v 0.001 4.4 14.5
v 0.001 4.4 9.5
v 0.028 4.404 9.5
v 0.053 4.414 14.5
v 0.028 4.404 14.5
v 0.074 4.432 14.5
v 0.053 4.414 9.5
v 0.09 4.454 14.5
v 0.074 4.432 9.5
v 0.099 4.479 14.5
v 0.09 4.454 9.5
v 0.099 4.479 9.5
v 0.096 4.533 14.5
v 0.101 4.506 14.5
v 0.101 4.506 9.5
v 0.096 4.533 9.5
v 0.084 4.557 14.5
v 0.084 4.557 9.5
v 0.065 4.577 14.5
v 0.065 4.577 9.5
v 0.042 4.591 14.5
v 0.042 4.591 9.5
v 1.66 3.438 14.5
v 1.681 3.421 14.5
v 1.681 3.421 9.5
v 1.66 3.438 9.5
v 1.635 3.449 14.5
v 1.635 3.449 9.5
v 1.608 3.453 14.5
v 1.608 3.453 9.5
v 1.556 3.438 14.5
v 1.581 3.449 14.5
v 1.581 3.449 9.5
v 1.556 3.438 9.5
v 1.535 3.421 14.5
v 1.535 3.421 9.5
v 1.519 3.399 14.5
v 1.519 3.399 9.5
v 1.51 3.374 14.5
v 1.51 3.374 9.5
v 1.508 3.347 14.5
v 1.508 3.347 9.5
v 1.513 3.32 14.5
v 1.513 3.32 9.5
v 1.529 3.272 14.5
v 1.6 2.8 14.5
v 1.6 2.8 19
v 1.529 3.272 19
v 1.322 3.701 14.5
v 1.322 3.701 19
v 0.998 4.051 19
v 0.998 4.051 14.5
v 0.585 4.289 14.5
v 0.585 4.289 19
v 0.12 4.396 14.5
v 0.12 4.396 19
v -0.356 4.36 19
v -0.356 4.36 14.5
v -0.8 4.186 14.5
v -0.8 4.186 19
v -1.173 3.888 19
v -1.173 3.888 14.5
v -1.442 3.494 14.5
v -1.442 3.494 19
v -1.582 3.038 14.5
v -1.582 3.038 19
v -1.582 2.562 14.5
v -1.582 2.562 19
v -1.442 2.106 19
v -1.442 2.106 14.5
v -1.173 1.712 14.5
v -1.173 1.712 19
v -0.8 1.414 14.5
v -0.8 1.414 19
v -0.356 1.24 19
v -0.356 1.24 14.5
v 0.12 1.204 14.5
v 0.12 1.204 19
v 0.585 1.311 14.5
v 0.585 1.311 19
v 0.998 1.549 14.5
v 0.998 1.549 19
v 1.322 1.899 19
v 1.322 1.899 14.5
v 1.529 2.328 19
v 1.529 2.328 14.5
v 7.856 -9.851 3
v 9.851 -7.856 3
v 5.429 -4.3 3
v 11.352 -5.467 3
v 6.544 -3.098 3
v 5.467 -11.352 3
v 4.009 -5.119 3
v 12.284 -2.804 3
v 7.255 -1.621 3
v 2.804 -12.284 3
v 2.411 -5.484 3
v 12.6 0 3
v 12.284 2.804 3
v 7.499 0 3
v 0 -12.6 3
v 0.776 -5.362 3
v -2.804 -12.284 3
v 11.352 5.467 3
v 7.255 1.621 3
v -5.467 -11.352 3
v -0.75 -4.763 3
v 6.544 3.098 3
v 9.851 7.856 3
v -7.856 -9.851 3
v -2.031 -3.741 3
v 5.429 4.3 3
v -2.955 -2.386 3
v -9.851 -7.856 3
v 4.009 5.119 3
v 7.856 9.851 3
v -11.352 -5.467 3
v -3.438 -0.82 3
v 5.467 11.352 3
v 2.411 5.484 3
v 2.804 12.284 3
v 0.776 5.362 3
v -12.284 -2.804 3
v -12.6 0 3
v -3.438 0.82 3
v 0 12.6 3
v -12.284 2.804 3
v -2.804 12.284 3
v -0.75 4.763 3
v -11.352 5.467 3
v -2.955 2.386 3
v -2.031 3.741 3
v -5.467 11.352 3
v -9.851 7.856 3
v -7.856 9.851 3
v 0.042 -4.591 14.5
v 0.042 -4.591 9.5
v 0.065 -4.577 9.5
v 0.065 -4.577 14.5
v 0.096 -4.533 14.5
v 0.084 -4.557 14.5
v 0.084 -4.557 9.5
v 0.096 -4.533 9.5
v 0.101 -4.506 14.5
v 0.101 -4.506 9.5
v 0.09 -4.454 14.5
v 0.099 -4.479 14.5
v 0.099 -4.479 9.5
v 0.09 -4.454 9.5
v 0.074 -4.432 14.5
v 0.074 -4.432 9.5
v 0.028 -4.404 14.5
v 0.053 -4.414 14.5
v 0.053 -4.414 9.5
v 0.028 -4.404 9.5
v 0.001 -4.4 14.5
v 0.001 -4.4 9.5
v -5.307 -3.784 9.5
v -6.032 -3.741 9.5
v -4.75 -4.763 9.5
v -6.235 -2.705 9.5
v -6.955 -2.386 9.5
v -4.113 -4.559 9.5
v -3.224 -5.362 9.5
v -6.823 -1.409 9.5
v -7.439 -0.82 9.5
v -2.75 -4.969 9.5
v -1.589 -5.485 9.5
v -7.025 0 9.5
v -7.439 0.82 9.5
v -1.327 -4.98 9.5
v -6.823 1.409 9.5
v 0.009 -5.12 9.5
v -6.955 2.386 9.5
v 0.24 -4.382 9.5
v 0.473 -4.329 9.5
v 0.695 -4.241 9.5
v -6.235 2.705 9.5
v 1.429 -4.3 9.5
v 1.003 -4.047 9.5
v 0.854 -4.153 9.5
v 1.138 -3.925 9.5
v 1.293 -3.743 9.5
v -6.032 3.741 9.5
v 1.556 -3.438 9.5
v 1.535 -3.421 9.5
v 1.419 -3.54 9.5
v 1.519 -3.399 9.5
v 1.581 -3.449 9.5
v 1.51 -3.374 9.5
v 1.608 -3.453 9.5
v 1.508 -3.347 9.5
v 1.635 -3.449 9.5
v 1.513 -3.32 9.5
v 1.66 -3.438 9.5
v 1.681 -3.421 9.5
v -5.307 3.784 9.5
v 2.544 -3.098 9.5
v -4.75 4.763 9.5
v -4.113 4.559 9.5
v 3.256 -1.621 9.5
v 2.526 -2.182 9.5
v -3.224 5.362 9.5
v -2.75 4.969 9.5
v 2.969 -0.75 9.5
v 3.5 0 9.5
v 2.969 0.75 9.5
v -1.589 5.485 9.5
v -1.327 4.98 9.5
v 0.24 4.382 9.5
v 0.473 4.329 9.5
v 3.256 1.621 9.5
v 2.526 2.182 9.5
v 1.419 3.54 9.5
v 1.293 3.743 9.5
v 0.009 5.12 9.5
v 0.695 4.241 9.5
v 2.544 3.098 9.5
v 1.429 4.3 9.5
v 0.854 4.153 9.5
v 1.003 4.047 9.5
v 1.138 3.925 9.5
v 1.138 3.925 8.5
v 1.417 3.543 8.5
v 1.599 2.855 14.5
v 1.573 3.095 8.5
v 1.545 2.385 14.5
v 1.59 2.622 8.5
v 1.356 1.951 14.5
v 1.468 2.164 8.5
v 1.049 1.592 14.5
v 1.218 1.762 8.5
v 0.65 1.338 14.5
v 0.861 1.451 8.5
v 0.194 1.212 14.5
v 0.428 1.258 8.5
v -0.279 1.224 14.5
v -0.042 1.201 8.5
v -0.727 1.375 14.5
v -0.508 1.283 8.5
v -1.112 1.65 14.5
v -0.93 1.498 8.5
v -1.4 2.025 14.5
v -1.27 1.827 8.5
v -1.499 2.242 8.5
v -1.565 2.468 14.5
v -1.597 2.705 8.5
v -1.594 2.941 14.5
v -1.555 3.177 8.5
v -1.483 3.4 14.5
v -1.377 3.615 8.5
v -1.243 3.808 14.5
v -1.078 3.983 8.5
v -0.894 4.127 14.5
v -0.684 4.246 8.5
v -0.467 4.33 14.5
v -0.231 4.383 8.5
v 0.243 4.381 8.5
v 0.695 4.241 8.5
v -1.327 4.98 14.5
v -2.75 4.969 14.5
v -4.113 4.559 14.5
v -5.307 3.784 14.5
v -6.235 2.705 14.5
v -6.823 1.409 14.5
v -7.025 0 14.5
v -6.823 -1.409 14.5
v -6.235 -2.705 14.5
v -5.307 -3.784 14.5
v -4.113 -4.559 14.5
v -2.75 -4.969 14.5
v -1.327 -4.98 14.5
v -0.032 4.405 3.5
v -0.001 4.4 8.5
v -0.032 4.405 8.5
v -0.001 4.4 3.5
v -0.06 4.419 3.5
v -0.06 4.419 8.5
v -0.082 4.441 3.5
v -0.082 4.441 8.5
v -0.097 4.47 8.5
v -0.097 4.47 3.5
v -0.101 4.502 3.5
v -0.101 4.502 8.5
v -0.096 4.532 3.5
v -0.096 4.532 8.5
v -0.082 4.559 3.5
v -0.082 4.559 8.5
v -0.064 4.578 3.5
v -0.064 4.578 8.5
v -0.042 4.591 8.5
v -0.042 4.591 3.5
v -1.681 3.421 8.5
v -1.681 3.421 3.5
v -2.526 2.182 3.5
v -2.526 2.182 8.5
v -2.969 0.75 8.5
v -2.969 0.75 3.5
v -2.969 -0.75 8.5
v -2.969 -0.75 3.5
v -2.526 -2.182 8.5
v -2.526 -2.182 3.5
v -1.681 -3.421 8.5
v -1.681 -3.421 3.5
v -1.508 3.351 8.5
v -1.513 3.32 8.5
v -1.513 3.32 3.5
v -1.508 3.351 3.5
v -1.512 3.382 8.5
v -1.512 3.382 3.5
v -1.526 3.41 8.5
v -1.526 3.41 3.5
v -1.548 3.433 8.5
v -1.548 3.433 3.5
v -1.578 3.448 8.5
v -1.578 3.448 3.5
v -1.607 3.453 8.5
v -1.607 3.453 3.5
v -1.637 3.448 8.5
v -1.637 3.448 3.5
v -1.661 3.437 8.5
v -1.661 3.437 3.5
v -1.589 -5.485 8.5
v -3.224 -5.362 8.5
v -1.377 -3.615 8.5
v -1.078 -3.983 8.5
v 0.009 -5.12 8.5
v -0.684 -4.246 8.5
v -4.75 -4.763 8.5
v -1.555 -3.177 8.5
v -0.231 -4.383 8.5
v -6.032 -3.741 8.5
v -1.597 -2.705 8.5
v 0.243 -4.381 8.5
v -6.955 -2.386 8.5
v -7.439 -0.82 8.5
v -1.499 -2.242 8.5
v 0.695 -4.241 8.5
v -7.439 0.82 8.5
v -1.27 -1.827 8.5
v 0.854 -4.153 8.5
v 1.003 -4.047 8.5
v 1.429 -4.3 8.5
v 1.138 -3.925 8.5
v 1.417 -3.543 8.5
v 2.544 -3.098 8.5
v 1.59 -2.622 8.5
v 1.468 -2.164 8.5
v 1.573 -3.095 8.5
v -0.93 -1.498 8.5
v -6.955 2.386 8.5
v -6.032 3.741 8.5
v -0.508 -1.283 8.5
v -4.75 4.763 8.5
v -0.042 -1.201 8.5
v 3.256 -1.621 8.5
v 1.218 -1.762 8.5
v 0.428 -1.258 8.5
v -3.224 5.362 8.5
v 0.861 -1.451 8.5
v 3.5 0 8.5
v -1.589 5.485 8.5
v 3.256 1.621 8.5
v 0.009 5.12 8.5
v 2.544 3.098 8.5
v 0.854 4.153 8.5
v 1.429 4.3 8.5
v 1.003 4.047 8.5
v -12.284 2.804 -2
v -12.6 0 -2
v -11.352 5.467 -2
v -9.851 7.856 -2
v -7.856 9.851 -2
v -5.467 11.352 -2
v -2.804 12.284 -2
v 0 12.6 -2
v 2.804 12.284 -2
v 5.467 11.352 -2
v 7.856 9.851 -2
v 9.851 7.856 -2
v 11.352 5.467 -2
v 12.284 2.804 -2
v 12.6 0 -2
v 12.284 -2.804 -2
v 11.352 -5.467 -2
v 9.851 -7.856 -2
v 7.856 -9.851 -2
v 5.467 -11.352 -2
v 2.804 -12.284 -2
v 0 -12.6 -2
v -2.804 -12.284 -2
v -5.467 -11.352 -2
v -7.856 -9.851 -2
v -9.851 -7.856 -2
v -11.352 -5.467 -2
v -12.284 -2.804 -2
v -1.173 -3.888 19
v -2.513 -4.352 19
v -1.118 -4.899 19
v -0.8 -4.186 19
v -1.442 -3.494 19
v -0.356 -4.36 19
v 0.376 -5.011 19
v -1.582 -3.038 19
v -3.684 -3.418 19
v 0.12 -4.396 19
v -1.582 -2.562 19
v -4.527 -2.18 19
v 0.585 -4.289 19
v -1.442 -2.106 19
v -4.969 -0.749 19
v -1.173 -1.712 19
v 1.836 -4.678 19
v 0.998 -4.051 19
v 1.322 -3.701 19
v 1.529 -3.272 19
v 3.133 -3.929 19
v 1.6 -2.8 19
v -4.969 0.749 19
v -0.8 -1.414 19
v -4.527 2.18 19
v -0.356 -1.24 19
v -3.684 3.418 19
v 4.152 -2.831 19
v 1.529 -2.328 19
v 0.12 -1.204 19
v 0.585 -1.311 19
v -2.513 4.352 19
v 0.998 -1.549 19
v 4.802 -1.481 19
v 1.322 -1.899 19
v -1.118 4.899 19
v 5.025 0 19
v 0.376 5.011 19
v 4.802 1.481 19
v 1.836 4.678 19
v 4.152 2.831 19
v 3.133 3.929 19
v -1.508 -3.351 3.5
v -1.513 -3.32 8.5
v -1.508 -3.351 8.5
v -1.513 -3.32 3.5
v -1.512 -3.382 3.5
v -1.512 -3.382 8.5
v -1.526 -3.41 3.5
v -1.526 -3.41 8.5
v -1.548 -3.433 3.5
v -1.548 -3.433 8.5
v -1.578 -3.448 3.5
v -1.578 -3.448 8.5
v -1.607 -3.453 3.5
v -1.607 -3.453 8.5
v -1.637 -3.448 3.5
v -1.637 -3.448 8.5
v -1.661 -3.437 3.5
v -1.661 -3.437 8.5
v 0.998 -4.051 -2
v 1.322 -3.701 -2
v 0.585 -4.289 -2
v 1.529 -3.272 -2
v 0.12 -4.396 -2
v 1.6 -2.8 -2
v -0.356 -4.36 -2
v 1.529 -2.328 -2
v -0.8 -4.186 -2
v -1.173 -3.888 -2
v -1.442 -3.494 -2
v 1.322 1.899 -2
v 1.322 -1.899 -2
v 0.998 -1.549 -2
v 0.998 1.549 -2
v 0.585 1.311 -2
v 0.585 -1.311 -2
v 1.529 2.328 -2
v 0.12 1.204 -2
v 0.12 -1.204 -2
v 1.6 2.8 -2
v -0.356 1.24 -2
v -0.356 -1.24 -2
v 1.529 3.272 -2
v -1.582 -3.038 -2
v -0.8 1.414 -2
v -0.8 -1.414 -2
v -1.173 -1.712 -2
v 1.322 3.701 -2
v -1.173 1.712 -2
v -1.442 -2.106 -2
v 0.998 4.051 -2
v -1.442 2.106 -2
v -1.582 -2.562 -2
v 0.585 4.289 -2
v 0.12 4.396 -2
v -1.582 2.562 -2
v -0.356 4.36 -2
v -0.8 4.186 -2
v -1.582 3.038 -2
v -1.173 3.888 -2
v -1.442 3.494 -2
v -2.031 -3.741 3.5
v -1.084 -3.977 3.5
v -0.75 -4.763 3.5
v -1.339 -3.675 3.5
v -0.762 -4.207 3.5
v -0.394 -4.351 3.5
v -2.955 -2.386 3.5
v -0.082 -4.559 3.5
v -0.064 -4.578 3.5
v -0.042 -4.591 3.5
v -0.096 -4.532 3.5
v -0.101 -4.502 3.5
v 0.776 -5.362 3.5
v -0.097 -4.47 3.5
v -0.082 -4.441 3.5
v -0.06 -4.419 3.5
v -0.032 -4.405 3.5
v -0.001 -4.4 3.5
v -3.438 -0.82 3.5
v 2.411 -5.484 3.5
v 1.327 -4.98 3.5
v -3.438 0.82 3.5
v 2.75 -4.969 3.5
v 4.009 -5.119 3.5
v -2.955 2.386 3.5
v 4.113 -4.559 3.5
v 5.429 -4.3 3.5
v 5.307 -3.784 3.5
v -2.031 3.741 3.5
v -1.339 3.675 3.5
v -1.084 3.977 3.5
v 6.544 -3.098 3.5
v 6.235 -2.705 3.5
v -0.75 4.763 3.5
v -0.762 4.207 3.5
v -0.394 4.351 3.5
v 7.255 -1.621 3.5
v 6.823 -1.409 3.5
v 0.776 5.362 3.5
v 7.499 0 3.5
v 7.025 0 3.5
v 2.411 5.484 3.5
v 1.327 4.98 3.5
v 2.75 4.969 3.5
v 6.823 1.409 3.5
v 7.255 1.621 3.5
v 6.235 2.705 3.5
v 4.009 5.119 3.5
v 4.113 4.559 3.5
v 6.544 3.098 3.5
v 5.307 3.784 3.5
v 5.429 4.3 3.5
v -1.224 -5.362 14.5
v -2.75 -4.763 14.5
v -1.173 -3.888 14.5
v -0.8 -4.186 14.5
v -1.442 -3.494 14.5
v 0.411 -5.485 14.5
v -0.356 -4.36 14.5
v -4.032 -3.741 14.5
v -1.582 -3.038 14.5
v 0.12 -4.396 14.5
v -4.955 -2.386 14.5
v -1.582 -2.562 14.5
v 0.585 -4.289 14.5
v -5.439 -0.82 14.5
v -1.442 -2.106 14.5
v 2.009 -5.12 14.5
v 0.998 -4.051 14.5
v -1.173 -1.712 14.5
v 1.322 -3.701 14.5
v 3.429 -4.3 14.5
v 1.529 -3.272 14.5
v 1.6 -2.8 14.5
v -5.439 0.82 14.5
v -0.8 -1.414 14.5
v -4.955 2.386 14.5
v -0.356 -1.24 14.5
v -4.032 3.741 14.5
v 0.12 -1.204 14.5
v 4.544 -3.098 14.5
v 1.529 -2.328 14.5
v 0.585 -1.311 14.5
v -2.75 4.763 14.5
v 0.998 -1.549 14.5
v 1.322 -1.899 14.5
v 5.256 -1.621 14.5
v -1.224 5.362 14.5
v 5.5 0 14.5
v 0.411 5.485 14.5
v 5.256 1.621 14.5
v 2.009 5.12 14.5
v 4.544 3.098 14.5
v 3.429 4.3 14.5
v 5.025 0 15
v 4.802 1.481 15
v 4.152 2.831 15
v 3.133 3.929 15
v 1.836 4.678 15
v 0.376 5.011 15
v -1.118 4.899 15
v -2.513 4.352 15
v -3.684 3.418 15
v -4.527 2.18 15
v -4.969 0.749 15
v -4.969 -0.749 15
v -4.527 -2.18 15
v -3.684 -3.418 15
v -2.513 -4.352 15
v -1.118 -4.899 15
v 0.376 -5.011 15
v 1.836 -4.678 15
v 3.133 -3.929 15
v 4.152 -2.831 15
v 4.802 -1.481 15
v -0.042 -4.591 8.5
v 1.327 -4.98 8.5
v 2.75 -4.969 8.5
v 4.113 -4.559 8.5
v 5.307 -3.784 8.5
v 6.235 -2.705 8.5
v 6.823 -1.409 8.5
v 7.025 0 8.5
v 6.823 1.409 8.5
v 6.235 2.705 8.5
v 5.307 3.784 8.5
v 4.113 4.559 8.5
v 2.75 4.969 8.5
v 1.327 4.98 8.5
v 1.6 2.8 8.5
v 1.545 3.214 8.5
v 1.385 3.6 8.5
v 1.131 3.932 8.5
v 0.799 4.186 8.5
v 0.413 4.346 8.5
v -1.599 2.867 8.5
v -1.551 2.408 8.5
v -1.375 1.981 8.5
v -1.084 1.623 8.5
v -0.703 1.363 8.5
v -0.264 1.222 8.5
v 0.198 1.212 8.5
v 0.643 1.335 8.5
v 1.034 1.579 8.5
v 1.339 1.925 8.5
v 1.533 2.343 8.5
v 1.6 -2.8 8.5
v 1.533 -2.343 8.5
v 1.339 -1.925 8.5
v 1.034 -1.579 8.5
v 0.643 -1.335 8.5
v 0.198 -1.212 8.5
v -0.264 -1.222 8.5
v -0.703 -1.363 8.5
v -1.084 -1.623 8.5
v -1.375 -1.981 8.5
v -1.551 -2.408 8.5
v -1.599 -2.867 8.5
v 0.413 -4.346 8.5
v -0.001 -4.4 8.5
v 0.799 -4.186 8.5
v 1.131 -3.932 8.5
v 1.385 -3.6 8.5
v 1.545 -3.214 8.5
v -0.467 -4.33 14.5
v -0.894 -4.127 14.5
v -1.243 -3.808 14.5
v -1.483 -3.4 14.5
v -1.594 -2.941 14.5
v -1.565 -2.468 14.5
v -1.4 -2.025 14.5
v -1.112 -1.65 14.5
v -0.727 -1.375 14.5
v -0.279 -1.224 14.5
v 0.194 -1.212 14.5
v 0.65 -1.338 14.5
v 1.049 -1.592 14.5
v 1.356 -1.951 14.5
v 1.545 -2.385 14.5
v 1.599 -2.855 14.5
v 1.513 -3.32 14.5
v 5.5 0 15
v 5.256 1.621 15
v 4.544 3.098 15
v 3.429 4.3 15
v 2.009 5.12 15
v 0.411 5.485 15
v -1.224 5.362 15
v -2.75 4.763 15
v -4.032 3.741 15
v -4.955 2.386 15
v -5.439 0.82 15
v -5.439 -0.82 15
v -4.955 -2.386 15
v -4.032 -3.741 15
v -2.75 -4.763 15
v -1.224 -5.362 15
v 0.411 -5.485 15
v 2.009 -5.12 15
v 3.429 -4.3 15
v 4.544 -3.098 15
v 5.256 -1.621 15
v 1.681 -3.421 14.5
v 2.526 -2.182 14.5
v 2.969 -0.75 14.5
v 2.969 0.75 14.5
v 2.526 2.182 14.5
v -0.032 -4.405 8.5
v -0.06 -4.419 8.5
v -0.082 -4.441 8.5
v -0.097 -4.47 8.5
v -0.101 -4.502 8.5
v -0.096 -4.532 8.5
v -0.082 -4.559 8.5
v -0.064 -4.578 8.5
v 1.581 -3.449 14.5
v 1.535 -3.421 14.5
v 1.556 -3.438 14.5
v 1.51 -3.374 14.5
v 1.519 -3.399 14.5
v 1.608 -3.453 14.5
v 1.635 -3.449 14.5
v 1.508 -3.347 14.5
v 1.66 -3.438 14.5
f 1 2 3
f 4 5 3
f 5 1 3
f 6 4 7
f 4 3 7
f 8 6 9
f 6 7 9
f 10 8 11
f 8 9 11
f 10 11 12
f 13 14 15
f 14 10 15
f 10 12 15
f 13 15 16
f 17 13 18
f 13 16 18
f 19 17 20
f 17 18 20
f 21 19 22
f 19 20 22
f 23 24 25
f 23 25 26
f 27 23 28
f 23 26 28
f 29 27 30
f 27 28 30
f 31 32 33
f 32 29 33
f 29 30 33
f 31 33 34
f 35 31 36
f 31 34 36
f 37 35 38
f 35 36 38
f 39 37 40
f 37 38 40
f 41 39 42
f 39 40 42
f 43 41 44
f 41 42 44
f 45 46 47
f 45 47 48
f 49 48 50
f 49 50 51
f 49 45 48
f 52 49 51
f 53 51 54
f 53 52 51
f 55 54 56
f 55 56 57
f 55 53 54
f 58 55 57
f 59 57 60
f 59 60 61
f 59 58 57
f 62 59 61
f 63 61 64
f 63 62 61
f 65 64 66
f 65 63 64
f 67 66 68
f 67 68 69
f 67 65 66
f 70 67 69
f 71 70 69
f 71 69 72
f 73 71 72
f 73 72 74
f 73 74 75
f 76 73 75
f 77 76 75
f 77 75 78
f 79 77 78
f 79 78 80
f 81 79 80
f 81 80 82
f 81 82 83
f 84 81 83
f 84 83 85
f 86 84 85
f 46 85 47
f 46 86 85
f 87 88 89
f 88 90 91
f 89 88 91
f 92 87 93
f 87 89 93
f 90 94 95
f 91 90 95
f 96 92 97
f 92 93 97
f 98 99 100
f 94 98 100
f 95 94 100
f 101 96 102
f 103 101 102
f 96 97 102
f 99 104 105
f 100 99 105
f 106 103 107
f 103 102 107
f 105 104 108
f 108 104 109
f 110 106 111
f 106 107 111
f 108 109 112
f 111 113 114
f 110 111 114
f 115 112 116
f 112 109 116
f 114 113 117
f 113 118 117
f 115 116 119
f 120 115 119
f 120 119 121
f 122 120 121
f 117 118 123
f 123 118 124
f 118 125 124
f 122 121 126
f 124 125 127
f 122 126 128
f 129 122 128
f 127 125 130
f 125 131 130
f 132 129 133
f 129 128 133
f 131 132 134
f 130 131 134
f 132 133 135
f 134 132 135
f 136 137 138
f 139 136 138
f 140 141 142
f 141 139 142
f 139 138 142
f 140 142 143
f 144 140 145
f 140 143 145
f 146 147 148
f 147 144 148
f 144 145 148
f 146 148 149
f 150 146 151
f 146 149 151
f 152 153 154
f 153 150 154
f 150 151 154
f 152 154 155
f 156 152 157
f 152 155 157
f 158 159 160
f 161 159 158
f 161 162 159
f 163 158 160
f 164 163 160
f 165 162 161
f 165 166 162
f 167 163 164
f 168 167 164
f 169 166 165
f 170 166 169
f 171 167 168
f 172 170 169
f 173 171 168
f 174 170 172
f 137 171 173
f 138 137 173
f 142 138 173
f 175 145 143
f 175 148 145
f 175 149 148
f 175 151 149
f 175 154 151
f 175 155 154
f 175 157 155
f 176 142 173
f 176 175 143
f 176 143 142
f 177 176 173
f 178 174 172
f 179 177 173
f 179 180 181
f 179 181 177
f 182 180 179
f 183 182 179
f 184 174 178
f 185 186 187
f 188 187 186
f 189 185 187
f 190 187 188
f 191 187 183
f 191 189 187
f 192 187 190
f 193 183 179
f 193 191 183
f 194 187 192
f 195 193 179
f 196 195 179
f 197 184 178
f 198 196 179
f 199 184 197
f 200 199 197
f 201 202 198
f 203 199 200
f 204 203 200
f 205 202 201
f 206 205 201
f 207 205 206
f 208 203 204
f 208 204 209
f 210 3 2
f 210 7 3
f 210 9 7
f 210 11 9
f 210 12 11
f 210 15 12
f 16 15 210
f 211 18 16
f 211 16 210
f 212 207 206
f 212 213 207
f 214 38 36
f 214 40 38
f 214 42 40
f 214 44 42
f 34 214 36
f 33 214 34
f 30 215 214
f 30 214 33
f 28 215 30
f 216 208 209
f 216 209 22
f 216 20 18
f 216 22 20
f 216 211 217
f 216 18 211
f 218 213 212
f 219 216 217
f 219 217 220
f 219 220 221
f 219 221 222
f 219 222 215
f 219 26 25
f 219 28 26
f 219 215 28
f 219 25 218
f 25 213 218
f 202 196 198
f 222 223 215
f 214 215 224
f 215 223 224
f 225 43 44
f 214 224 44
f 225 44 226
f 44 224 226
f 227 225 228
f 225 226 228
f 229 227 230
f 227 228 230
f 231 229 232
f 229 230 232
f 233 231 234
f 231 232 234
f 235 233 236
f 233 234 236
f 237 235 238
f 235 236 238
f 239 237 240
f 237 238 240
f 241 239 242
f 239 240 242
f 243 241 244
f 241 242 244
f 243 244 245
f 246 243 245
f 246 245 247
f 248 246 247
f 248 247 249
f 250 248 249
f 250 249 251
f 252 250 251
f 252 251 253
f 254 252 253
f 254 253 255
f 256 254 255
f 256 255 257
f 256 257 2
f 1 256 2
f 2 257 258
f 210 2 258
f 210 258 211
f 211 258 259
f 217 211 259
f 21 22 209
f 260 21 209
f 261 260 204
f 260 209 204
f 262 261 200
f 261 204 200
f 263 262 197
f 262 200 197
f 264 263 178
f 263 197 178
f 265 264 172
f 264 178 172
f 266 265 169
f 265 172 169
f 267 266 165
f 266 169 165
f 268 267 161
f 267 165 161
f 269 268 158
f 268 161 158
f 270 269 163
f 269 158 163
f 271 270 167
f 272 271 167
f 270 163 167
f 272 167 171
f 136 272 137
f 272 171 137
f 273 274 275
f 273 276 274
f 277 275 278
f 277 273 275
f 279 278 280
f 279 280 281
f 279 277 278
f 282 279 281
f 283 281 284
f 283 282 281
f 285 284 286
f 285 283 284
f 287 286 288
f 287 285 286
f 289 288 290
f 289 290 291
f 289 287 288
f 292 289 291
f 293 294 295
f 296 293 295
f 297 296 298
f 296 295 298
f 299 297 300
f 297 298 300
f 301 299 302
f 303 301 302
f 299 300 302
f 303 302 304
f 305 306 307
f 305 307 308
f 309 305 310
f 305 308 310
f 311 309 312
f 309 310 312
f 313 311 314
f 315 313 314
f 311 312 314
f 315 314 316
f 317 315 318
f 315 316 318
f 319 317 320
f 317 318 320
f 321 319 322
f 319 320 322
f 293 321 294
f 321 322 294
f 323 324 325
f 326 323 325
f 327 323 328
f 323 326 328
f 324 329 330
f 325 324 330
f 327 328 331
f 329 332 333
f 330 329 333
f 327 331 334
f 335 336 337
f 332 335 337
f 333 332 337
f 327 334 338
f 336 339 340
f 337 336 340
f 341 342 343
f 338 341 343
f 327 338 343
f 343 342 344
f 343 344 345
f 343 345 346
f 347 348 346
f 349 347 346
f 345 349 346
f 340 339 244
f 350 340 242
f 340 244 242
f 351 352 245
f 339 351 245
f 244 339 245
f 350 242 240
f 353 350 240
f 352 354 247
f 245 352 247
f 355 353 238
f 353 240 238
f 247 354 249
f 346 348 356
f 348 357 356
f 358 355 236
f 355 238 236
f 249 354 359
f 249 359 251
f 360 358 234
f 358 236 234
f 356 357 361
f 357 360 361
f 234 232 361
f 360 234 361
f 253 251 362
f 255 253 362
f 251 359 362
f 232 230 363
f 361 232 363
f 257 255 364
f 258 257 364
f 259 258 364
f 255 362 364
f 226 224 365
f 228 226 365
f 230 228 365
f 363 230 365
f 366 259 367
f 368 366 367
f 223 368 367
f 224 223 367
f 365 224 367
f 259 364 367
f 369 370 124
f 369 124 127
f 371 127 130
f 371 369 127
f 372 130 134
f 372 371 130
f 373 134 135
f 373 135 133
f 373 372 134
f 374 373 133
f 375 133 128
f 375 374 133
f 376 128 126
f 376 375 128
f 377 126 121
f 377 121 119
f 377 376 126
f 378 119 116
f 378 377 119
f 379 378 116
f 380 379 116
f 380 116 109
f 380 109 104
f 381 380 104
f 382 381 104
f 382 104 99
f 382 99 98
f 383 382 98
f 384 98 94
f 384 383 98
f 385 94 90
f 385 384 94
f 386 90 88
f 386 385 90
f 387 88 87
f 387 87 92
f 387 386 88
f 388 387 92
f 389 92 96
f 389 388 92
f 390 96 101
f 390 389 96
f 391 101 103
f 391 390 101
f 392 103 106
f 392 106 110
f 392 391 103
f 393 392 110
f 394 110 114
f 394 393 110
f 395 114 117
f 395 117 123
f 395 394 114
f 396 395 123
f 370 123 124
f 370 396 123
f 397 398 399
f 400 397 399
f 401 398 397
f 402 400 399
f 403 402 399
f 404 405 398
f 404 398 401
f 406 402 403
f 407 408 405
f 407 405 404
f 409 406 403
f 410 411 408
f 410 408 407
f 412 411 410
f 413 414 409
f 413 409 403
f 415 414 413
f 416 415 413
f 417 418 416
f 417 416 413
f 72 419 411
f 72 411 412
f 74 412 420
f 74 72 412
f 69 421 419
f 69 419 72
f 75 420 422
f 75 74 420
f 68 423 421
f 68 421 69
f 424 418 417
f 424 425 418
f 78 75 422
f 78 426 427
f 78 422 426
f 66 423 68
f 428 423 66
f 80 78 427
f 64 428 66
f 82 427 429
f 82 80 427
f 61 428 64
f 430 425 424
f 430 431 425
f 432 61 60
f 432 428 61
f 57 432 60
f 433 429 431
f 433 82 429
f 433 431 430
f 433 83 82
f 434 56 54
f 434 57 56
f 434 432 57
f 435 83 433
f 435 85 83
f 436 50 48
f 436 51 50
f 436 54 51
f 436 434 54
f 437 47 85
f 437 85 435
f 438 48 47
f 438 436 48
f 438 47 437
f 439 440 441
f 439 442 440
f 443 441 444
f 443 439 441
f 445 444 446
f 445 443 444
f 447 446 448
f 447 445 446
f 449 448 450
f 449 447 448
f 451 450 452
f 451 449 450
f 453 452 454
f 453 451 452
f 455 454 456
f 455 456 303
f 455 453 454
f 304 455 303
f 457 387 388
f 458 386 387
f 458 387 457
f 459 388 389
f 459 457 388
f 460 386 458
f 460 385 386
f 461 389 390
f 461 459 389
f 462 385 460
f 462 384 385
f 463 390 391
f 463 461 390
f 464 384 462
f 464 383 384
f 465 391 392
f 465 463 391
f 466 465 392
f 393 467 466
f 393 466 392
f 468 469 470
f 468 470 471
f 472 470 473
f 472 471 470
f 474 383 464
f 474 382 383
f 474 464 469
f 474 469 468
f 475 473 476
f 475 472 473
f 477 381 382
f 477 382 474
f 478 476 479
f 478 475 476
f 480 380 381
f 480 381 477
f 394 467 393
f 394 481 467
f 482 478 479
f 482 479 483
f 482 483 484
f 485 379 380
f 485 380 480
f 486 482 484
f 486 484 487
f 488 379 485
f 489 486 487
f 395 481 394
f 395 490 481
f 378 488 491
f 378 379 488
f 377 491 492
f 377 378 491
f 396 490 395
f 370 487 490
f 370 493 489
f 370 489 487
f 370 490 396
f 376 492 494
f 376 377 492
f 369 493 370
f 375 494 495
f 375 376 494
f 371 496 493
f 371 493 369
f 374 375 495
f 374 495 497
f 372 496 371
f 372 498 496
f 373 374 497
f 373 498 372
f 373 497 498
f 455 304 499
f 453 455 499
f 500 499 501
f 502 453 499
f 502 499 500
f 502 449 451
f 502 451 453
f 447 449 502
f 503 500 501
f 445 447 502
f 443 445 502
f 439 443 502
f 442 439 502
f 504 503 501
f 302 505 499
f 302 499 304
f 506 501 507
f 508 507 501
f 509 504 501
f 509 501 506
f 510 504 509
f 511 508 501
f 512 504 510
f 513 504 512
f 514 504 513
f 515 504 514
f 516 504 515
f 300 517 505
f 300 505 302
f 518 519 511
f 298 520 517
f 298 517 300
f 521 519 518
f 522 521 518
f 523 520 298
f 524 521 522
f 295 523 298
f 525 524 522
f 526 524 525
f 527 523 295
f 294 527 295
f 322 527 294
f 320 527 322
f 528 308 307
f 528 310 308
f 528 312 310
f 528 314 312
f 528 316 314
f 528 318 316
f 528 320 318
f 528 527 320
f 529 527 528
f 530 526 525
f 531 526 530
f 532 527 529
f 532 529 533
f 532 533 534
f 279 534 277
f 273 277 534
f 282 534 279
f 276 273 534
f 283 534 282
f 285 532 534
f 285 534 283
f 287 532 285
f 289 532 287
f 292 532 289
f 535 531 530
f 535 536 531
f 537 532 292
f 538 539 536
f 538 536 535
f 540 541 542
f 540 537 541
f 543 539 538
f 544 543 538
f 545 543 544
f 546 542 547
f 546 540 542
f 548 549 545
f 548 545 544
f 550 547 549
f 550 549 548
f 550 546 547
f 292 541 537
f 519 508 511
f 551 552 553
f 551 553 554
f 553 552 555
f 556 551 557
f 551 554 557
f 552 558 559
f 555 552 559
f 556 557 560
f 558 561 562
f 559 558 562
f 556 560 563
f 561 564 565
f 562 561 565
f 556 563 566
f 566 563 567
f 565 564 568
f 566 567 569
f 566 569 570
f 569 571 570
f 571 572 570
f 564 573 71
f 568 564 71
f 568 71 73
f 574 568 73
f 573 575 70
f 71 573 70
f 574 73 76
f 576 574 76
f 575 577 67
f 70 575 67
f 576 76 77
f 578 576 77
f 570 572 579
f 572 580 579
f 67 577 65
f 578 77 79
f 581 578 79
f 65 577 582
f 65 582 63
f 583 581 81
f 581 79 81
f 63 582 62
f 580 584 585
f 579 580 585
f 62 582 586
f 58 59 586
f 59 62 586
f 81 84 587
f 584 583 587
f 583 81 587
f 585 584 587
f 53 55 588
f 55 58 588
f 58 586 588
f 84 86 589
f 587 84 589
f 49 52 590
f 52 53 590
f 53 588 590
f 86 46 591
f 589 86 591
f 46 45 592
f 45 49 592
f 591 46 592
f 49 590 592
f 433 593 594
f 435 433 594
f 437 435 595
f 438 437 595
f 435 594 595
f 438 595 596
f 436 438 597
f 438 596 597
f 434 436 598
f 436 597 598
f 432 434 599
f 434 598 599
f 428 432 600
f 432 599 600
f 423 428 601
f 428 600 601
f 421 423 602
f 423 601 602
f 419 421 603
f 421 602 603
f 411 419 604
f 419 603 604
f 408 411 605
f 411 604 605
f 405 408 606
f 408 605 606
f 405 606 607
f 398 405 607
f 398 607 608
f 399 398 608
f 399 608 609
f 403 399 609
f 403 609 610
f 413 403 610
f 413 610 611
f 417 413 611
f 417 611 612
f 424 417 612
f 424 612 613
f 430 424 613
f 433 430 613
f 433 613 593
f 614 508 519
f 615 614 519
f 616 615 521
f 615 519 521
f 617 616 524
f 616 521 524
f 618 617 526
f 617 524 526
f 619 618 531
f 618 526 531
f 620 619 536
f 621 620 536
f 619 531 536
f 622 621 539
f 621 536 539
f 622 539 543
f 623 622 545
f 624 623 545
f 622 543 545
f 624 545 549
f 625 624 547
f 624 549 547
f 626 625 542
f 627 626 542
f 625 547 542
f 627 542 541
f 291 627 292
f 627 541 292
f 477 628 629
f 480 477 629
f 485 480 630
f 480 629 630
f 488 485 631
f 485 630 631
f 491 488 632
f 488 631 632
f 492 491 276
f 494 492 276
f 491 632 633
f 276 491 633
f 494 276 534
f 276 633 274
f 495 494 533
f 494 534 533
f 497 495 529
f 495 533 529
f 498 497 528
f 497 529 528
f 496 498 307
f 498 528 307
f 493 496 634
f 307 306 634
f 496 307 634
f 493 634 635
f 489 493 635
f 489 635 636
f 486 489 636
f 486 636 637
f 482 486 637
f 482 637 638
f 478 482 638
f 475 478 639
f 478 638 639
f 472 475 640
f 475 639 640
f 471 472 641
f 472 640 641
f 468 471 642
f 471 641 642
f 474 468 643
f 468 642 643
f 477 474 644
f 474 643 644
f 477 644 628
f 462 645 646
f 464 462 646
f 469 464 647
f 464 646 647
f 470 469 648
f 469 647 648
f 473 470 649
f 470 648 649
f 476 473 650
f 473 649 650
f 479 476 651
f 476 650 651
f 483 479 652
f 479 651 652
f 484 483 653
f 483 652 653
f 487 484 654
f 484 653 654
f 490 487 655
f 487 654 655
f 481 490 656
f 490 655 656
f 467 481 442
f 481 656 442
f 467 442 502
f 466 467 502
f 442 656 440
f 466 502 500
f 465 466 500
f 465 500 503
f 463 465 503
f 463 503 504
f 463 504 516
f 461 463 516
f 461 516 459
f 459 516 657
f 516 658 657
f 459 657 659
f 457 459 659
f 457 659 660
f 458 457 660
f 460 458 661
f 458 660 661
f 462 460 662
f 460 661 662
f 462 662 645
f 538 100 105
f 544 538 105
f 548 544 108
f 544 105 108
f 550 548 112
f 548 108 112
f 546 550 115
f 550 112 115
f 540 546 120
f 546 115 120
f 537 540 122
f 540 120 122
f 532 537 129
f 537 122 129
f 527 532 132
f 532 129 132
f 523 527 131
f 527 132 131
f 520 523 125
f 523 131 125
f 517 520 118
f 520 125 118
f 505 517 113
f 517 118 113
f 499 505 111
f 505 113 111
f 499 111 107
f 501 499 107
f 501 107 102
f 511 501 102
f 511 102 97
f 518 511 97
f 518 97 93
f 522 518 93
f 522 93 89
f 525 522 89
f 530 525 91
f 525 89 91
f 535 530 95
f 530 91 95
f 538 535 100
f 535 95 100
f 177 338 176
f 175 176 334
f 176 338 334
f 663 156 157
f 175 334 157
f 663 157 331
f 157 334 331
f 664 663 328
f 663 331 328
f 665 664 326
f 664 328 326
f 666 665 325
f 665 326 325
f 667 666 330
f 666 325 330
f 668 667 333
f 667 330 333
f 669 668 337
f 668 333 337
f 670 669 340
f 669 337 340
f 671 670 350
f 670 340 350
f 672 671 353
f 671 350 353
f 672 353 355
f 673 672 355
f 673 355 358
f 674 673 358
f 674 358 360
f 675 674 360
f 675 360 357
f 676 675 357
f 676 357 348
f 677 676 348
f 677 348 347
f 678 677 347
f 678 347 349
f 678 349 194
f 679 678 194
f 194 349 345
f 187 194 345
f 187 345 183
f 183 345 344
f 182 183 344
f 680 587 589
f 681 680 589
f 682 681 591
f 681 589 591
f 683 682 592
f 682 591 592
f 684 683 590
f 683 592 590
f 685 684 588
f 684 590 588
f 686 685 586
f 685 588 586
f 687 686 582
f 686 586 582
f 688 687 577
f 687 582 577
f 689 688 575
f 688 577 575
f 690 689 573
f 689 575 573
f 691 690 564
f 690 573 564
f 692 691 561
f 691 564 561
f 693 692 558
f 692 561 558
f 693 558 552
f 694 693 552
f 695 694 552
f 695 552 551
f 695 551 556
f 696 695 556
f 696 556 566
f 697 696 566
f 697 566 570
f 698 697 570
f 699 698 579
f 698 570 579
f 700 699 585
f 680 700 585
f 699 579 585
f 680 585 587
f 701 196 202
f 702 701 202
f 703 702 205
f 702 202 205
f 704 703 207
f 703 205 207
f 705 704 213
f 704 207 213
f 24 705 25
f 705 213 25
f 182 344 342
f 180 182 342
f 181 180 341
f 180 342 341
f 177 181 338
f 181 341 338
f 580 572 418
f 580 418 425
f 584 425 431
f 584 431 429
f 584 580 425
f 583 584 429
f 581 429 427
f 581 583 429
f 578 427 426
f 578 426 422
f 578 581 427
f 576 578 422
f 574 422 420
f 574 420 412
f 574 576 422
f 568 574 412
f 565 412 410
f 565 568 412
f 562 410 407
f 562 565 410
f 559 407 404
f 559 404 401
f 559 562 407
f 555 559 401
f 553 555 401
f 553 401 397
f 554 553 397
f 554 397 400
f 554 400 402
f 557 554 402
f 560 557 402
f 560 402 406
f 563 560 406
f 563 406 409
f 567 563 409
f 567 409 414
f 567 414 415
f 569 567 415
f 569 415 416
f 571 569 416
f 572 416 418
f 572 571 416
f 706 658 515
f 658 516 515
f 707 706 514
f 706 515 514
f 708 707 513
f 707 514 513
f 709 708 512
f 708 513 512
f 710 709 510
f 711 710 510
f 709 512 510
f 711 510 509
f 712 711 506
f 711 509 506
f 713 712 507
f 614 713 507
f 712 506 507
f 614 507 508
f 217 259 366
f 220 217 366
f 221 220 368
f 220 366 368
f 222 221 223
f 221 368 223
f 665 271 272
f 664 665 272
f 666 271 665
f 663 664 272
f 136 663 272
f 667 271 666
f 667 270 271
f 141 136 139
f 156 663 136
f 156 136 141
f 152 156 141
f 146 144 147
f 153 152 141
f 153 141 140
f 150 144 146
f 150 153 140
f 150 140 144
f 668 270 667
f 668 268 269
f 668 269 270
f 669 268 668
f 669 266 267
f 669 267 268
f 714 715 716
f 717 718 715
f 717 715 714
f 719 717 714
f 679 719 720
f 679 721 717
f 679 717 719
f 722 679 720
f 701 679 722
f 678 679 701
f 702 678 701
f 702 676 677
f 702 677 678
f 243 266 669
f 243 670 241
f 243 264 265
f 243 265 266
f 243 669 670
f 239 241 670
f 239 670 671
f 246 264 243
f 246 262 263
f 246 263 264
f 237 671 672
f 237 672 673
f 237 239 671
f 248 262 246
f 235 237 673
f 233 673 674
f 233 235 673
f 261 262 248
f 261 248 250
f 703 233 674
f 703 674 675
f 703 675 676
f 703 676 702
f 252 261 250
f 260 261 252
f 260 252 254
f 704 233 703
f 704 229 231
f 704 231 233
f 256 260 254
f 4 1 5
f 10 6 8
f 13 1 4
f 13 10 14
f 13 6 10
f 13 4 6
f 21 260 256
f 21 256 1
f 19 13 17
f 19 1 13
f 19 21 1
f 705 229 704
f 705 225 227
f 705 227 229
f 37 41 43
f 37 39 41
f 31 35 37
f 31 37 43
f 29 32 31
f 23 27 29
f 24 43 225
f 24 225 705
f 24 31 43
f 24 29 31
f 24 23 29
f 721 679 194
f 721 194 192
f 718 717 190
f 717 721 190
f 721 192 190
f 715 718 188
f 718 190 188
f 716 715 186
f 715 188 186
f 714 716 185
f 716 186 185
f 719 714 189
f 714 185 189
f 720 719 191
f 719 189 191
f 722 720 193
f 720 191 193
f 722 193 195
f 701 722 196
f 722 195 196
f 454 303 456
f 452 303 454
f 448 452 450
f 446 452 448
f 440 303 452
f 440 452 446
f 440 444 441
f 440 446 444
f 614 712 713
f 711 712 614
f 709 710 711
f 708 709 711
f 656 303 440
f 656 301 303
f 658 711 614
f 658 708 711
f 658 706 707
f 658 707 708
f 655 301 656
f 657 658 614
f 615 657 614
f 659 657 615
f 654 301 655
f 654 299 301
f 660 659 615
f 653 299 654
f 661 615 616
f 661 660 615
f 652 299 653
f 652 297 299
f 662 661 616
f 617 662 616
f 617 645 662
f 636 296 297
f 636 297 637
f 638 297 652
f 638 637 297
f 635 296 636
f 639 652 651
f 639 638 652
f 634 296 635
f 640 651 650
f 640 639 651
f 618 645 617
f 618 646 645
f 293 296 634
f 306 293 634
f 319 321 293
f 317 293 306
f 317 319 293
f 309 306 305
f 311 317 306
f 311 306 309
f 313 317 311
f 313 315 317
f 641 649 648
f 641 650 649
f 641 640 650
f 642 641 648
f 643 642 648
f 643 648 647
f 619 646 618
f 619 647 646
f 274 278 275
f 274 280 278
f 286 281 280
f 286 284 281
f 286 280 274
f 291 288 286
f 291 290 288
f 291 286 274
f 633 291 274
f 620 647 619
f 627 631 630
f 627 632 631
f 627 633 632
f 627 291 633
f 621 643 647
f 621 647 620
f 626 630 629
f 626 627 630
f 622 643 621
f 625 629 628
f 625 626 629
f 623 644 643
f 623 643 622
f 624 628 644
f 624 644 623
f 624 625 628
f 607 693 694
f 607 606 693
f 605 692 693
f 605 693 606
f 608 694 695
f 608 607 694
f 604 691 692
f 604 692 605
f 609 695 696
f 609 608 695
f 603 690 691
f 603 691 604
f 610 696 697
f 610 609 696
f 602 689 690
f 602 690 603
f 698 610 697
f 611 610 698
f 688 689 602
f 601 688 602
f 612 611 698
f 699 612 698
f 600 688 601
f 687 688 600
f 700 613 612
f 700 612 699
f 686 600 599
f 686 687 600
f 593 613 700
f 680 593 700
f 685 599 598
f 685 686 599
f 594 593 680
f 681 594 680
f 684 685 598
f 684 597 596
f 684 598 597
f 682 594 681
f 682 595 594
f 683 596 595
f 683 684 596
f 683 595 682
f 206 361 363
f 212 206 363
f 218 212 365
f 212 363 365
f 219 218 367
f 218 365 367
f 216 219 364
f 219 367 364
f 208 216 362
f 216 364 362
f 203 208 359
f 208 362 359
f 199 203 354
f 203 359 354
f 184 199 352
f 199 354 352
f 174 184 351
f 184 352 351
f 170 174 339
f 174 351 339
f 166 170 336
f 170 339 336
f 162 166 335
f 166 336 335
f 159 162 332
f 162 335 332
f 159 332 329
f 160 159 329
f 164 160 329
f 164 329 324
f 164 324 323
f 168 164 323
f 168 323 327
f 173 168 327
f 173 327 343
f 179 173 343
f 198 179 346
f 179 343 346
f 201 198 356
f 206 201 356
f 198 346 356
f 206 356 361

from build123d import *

# Parameters (mm, degrees)
SKETCH1_R            = 12.6
BOSS_EXTRUDE1_DEPTH  = 5
SKETCH2_R            = 5.499454457575955
SKETCH2_R_2          = 5.0249999999999995
BOSS_EXTRUDE2_DEPTH  = 0.5
SKETCH2_3_R          = 5.0249999999999995
BOSS_EXTRUDE3_DEPTH  = 5.5
BOSS_EXTRUDE4_START  = 5.5
SKETCH3_R            = 5.5
SKETCH3_R_2          = 5.0249999999999995
BOSS_EXTRUDE4_DEPTH  = 1
BOSS_EXTRUDE5_START  = 5.5
SKETCH3_3_R          = 5.0249999999999995
BOSS_EXTRUDE5_DEPTH  = 6
BOSS_EXTRUDE6_START  = 11.5
SKETCH4_R            = 5.5
SKETCH4_R_2          = 5.0249999999999995
BOSS_EXTRUDE6_DEPTH  = 0.5
BOSS_EXTRUDE7_START  = 11.5
SKETCH4_7_R          = 5.0249999999999995
BOSS_EXTRUDE7_DEPTH  = 4.5
SKETCH5_R            = 1.6000000000000003
CUT_EXTRUDE1_DEPTH   = 28.541241802068402
SPLIT1_START         = 8.5
SPLIT1_OUTLINE_R     = 1.6
SPLIT1_DEPTH         = 10.5
SPLIT1_2_DEPTH       = 6
SPLIT1_3_OUTLINE_R   = 5.5
SPLIT1_3_DEPTH       = 1
SPLIT1_START_2       = 14.5
SPLIT1_4_OUTLINE_R   = 5.025
SPLIT1_4_OUTLINE_R_2 = 1.6
SPLIT1_4_DEPTH       = 4.5
SPLIT1_5_OUTLINE_R   = 5.5
SPLIT1_5_OUTLINE_R_2 = 5.025
SPLIT1_5_DEPTH       = 0.5
FILLET1_R            = 0.1
FILLET2_R            = 0.1


# Read off the part's stored shape, not the designer's step: Split1
with BuildPart() as part:
    # Sketch1 → Boss-Extrude1 (new body)
    with BuildSketch(Plane(origin=(0, 0, -2), x_dir=(-1, 0, 0), z_dir=(0, 0, -1))):
        Circle(SKETCH1_R)
    extrude(amount=-BOSS_EXTRUDE1_DEPTH)

    # Sketch2 → Boss-Extrude2 (add)
    with BuildSketch(Plane.XY.offset(3)):
        with Locations((2, 0)):
            Circle(SKETCH2_R)
        with Locations((2, 0)):
            Circle(SKETCH2_R_2, mode=Mode.SUBTRACT)
    extrude(amount=BOSS_EXTRUDE2_DEPTH)

    # Sketch2<3> → Boss-Extrude3 (add)
    with BuildSketch(Plane.XY.offset(3)):
        with Locations((2, 0)):
            Circle(SKETCH2_3_R)
    extrude(amount=BOSS_EXTRUDE3_DEPTH)



with BuildPart() as body_2:
    # Sketch3 → Boss-Extrude4 (new body)
    with BuildSketch(Plane.XY.offset(3).offset(BOSS_EXTRUDE4_START)):
        with Locations((-2, -2.4e-16)):
            Circle(SKETCH3_R)
        with Locations((-2, -2.4e-16)):
            Circle(SKETCH3_R_2, mode=Mode.SUBTRACT)
    extrude(amount=BOSS_EXTRUDE4_DEPTH)


with BuildPart() as part_1:
    add(part.part)

    add(body_2.part)  # Boss-Extrude5 merges body 2
    # Sketch3<3> → Boss-Extrude5 (add)
    with BuildSketch(Plane.XY.offset(3).offset(BOSS_EXTRUDE5_START)):
        with Locations((-2, -2.4e-16)):
            Circle(SKETCH3_3_R)
    extrude(amount=BOSS_EXTRUDE5_DEPTH)

    # Sketch4 → Boss-Extrude6 (add)
    with BuildSketch(Plane.XY.offset(3).offset(BOSS_EXTRUDE6_START)):
        with Locations(Location((0, 0, 0), (0, 0, 114.145956113))):
            Circle(SKETCH4_R)
        with Locations(Location((0, 0, 0), (0, 0, 101.478778724))):
            Circle(SKETCH4_R_2, mode=Mode.SUBTRACT)
    extrude(amount=BOSS_EXTRUDE6_DEPTH)

    # Sketch4<7> → Boss-Extrude7 (add)
    with BuildSketch(Plane.XY.offset(3).offset(BOSS_EXTRUDE7_START)):
        Circle(SKETCH4_7_R)
    extrude(amount=BOSS_EXTRUDE7_DEPTH)

    # Sketch5 → Cut-Extrude1 (cut, through all)
    with BuildSketch(Plane.XY.offset(19)):
        with Locations((2e-17, 2.8)):
            Circle(SKETCH5_R)
        with Locations((7.1e-16, -2.8)):
            Circle(SKETCH5_R)
    extrude(amount=-CUT_EXTRUDE1_DEPTH, mode=Mode.SUBTRACT)

    # Split1 outline → Split1 (cut)
    with BuildSketch(Plane.XY.offset(SPLIT1_START)):
        with BuildLine():
            ThreePointArc((-1, 5.408326913), (-7.5, 0), (-1, -5.408326913))
            ThreePointArc((-1, -5.408326913), (5.5, 0), (-1, 5.408326913))
        make_face()
        with Locations((0, 2.8)):
            Circle(SPLIT1_OUTLINE_R, mode=Mode.SUBTRACT)
        with Locations((0, -2.8)):
            Circle(SPLIT1_OUTLINE_R, mode=Mode.SUBTRACT)
    extrude(amount=SPLIT1_DEPTH, mode=Mode.SUBTRACT)

    # Fillet2
    fillet2_edges = [part_1.edges().sort_by_distance(p)[0] for p in [
        (-0.6950501563684846, -4.241147209736796, 6),
        (-1.1378256882261084, -3.9248789726956352, 6),
        (-1.1378256882260929, 3.924878972695648, 6),
        (-0.6950501563685023, 4.241147209736784, 6),
    ]]
    fillet(fillet2_edges, radius=FILLET2_R)


with BuildPart() as body_2_2:
    # Split1 2 outline → Split1 2 (new body)
    with BuildSketch(Plane.XY.offset(SPLIT1_START)):
        with BuildLine():
            ThreePointArc((1.137825688, -3.924878973), (3.025, 0), (1.137825688, 3.924878973))
            ThreePointArc((1.137825688, 3.924878973), (-0.92998111, 1.498026446), (0.695050156, 4.24114721))
            ThreePointArc((0.695050156, 4.24114721), (-7.025, 0), (0.695050156, -4.24114721))
            ThreePointArc((0.695050156, -4.24114721), (-0.92998111, -1.498026446), (1.137825688, -3.924878973))
        make_face()
    extrude(amount=SPLIT1_2_DEPTH)

    # Split1 3 outline → Split1 3 (add)
    with BuildSketch(Plane.XY.offset(SPLIT1_START)):
        with Locations((-2, 0)):
            Circle(SPLIT1_3_OUTLINE_R)
        with BuildLine():
            ThreePointArc((0.695050156, 4.24114721), (0.92998111, 4.101973554), (1.137825688, 3.924878973))
            ThreePointArc((1.137825688, 3.924878973), (3.025, 0), (1.137825688, -3.924878973))
            ThreePointArc((1.137825688, -3.924878973), (0.92998111, -4.101973554), (0.695050156, -4.24114721))
            ThreePointArc((0.695050156, -4.24114721), (-7.025, 0), (0.695050156, 4.24114721))
        make_face(mode=Mode.SUBTRACT)
    extrude(amount=SPLIT1_3_DEPTH)

    # Fillet1
    # the kernel refuses this fillet: 0.1 mm, written as the material it takes off along each edge
    with BuildSketch(Plane(origin=(1.1378256880000006, -3.924878973, 9.5), x_dir=(0.5272838464707954, 0.8496892050926401, 0), z_dir=(0, 0, 1))) as fillet1_piece_1:
        with BuildLine():
            CenterArc((0.7339208558356513, -0.09749554475196075), FILLET1_R, 102.8500510005881, 156.06997269077794)
            ThreePointArc((0.7147029545095785, -0.19563153340353207), (0.3537405486988825, -0.1110076139593656), (0, 0))
            ThreePointArc((0, 0), (0.3558404149511242, -0.0400712839705069), (0.7116808299022489, -4e-17))
        make_face()
    extrude(amount=6.85248483469929, mode=Mode.SUBTRACT)
    with BuildSketch(Plane(origin=(0.6950501559999995, -4.241147210000001, 9.5), x_dir=(-0.9747710361649122, -0.22320713934366773, 0), z_dir=(0, 0, 1))) as fillet1_piece_2:
        with BuildLine():
            CenterArc((0.7339208553218103, 0.09749554475551281), FILLET1_R, 101.07997632228573, 156.06997268627677)
            ThreePointArc((0.714702953972355, 0.19563153340250483), (0.35374054843265157, 0.1110076139403167), (0, 0))
            ThreePointArc((0, 0), (0.35584041470198946, 0.04007128391367626), (0.7116808294039787, 0))
        make_face()
    extrude(amount=6.8524848334032065, mode=Mode.SUBTRACT)
    with BuildSketch(Plane(origin=(0.6950501560000002, 4.24114721, 9.5), x_dir=(-0.8812560463152725, 0.4726391655721877, 0), z_dir=(0, 0, 1))) as fillet1_piece_3:
        with BuildLine():
            CenterArc((0.7336208593975166, 0.09972781848774585), FILLET1_R, 118.15832442623193, 156.06997268627686)
            ThreePointArc((0.6864298993019216, 0.18789251258496353), (0.353794262604145, 0.05529672936227222), (0, 0))
            ThreePointArc((0, 0), (0.3704969666806427, -0.01367712099081776), (0.7409939333612872, 0))
        make_face()
    extrude(amount=6.852484833403217, mode=Mode.SUBTRACT)
    with BuildSketch(Plane(origin=(1.1378256880000008, 3.924878973, 9.5), x_dir=(0.7329038743989365, -0.6803322062720741, 0), z_dir=(0, 0, 1))) as fillet1_piece_4:
        with BuildLine():
            CenterArc((0.7336208599111411, -0.09972781848739057), FILLET1_R, 85.77170288473079, 156.06997269077783)
            ThreePointArc((0.6864298998182243, -0.1878925125860417), (0.3537942628699536, -0.05529672930598591), (0, 0))
            ThreePointArc((0, 0), (0.3704969669398583, 0.013677121009324), (0.7409939338797163, 3e-17))
        make_face()
    extrude(amount=6.85248483469929, mode=Mode.SUBTRACT)


with BuildPart() as body_3:
    # Split1 4 outline → Split1 4 (new body)
    with BuildSketch(Plane.XY.offset(SPLIT1_START_2)):
        Circle(SPLIT1_4_OUTLINE_R)
        with Locations((0, -2.8)):
            Circle(SPLIT1_4_OUTLINE_R_2, mode=Mode.SUBTRACT)
        with Locations((0, 2.8)):
            Circle(SPLIT1_4_OUTLINE_R_2, mode=Mode.SUBTRACT)
    extrude(amount=SPLIT1_4_DEPTH)

    # Split1 5 outline → Split1 5 (add)
    with BuildSketch(Plane.XY.offset(SPLIT1_START_2)):
        Circle(SPLIT1_5_OUTLINE_R)
        Circle(SPLIT1_5_OUTLINE_R_2, mode=Mode.SUBTRACT)
    extrude(amount=SPLIT1_5_DEPTH)


solid = Compound([part_1.part, body_2_2.part, body_3.part])
